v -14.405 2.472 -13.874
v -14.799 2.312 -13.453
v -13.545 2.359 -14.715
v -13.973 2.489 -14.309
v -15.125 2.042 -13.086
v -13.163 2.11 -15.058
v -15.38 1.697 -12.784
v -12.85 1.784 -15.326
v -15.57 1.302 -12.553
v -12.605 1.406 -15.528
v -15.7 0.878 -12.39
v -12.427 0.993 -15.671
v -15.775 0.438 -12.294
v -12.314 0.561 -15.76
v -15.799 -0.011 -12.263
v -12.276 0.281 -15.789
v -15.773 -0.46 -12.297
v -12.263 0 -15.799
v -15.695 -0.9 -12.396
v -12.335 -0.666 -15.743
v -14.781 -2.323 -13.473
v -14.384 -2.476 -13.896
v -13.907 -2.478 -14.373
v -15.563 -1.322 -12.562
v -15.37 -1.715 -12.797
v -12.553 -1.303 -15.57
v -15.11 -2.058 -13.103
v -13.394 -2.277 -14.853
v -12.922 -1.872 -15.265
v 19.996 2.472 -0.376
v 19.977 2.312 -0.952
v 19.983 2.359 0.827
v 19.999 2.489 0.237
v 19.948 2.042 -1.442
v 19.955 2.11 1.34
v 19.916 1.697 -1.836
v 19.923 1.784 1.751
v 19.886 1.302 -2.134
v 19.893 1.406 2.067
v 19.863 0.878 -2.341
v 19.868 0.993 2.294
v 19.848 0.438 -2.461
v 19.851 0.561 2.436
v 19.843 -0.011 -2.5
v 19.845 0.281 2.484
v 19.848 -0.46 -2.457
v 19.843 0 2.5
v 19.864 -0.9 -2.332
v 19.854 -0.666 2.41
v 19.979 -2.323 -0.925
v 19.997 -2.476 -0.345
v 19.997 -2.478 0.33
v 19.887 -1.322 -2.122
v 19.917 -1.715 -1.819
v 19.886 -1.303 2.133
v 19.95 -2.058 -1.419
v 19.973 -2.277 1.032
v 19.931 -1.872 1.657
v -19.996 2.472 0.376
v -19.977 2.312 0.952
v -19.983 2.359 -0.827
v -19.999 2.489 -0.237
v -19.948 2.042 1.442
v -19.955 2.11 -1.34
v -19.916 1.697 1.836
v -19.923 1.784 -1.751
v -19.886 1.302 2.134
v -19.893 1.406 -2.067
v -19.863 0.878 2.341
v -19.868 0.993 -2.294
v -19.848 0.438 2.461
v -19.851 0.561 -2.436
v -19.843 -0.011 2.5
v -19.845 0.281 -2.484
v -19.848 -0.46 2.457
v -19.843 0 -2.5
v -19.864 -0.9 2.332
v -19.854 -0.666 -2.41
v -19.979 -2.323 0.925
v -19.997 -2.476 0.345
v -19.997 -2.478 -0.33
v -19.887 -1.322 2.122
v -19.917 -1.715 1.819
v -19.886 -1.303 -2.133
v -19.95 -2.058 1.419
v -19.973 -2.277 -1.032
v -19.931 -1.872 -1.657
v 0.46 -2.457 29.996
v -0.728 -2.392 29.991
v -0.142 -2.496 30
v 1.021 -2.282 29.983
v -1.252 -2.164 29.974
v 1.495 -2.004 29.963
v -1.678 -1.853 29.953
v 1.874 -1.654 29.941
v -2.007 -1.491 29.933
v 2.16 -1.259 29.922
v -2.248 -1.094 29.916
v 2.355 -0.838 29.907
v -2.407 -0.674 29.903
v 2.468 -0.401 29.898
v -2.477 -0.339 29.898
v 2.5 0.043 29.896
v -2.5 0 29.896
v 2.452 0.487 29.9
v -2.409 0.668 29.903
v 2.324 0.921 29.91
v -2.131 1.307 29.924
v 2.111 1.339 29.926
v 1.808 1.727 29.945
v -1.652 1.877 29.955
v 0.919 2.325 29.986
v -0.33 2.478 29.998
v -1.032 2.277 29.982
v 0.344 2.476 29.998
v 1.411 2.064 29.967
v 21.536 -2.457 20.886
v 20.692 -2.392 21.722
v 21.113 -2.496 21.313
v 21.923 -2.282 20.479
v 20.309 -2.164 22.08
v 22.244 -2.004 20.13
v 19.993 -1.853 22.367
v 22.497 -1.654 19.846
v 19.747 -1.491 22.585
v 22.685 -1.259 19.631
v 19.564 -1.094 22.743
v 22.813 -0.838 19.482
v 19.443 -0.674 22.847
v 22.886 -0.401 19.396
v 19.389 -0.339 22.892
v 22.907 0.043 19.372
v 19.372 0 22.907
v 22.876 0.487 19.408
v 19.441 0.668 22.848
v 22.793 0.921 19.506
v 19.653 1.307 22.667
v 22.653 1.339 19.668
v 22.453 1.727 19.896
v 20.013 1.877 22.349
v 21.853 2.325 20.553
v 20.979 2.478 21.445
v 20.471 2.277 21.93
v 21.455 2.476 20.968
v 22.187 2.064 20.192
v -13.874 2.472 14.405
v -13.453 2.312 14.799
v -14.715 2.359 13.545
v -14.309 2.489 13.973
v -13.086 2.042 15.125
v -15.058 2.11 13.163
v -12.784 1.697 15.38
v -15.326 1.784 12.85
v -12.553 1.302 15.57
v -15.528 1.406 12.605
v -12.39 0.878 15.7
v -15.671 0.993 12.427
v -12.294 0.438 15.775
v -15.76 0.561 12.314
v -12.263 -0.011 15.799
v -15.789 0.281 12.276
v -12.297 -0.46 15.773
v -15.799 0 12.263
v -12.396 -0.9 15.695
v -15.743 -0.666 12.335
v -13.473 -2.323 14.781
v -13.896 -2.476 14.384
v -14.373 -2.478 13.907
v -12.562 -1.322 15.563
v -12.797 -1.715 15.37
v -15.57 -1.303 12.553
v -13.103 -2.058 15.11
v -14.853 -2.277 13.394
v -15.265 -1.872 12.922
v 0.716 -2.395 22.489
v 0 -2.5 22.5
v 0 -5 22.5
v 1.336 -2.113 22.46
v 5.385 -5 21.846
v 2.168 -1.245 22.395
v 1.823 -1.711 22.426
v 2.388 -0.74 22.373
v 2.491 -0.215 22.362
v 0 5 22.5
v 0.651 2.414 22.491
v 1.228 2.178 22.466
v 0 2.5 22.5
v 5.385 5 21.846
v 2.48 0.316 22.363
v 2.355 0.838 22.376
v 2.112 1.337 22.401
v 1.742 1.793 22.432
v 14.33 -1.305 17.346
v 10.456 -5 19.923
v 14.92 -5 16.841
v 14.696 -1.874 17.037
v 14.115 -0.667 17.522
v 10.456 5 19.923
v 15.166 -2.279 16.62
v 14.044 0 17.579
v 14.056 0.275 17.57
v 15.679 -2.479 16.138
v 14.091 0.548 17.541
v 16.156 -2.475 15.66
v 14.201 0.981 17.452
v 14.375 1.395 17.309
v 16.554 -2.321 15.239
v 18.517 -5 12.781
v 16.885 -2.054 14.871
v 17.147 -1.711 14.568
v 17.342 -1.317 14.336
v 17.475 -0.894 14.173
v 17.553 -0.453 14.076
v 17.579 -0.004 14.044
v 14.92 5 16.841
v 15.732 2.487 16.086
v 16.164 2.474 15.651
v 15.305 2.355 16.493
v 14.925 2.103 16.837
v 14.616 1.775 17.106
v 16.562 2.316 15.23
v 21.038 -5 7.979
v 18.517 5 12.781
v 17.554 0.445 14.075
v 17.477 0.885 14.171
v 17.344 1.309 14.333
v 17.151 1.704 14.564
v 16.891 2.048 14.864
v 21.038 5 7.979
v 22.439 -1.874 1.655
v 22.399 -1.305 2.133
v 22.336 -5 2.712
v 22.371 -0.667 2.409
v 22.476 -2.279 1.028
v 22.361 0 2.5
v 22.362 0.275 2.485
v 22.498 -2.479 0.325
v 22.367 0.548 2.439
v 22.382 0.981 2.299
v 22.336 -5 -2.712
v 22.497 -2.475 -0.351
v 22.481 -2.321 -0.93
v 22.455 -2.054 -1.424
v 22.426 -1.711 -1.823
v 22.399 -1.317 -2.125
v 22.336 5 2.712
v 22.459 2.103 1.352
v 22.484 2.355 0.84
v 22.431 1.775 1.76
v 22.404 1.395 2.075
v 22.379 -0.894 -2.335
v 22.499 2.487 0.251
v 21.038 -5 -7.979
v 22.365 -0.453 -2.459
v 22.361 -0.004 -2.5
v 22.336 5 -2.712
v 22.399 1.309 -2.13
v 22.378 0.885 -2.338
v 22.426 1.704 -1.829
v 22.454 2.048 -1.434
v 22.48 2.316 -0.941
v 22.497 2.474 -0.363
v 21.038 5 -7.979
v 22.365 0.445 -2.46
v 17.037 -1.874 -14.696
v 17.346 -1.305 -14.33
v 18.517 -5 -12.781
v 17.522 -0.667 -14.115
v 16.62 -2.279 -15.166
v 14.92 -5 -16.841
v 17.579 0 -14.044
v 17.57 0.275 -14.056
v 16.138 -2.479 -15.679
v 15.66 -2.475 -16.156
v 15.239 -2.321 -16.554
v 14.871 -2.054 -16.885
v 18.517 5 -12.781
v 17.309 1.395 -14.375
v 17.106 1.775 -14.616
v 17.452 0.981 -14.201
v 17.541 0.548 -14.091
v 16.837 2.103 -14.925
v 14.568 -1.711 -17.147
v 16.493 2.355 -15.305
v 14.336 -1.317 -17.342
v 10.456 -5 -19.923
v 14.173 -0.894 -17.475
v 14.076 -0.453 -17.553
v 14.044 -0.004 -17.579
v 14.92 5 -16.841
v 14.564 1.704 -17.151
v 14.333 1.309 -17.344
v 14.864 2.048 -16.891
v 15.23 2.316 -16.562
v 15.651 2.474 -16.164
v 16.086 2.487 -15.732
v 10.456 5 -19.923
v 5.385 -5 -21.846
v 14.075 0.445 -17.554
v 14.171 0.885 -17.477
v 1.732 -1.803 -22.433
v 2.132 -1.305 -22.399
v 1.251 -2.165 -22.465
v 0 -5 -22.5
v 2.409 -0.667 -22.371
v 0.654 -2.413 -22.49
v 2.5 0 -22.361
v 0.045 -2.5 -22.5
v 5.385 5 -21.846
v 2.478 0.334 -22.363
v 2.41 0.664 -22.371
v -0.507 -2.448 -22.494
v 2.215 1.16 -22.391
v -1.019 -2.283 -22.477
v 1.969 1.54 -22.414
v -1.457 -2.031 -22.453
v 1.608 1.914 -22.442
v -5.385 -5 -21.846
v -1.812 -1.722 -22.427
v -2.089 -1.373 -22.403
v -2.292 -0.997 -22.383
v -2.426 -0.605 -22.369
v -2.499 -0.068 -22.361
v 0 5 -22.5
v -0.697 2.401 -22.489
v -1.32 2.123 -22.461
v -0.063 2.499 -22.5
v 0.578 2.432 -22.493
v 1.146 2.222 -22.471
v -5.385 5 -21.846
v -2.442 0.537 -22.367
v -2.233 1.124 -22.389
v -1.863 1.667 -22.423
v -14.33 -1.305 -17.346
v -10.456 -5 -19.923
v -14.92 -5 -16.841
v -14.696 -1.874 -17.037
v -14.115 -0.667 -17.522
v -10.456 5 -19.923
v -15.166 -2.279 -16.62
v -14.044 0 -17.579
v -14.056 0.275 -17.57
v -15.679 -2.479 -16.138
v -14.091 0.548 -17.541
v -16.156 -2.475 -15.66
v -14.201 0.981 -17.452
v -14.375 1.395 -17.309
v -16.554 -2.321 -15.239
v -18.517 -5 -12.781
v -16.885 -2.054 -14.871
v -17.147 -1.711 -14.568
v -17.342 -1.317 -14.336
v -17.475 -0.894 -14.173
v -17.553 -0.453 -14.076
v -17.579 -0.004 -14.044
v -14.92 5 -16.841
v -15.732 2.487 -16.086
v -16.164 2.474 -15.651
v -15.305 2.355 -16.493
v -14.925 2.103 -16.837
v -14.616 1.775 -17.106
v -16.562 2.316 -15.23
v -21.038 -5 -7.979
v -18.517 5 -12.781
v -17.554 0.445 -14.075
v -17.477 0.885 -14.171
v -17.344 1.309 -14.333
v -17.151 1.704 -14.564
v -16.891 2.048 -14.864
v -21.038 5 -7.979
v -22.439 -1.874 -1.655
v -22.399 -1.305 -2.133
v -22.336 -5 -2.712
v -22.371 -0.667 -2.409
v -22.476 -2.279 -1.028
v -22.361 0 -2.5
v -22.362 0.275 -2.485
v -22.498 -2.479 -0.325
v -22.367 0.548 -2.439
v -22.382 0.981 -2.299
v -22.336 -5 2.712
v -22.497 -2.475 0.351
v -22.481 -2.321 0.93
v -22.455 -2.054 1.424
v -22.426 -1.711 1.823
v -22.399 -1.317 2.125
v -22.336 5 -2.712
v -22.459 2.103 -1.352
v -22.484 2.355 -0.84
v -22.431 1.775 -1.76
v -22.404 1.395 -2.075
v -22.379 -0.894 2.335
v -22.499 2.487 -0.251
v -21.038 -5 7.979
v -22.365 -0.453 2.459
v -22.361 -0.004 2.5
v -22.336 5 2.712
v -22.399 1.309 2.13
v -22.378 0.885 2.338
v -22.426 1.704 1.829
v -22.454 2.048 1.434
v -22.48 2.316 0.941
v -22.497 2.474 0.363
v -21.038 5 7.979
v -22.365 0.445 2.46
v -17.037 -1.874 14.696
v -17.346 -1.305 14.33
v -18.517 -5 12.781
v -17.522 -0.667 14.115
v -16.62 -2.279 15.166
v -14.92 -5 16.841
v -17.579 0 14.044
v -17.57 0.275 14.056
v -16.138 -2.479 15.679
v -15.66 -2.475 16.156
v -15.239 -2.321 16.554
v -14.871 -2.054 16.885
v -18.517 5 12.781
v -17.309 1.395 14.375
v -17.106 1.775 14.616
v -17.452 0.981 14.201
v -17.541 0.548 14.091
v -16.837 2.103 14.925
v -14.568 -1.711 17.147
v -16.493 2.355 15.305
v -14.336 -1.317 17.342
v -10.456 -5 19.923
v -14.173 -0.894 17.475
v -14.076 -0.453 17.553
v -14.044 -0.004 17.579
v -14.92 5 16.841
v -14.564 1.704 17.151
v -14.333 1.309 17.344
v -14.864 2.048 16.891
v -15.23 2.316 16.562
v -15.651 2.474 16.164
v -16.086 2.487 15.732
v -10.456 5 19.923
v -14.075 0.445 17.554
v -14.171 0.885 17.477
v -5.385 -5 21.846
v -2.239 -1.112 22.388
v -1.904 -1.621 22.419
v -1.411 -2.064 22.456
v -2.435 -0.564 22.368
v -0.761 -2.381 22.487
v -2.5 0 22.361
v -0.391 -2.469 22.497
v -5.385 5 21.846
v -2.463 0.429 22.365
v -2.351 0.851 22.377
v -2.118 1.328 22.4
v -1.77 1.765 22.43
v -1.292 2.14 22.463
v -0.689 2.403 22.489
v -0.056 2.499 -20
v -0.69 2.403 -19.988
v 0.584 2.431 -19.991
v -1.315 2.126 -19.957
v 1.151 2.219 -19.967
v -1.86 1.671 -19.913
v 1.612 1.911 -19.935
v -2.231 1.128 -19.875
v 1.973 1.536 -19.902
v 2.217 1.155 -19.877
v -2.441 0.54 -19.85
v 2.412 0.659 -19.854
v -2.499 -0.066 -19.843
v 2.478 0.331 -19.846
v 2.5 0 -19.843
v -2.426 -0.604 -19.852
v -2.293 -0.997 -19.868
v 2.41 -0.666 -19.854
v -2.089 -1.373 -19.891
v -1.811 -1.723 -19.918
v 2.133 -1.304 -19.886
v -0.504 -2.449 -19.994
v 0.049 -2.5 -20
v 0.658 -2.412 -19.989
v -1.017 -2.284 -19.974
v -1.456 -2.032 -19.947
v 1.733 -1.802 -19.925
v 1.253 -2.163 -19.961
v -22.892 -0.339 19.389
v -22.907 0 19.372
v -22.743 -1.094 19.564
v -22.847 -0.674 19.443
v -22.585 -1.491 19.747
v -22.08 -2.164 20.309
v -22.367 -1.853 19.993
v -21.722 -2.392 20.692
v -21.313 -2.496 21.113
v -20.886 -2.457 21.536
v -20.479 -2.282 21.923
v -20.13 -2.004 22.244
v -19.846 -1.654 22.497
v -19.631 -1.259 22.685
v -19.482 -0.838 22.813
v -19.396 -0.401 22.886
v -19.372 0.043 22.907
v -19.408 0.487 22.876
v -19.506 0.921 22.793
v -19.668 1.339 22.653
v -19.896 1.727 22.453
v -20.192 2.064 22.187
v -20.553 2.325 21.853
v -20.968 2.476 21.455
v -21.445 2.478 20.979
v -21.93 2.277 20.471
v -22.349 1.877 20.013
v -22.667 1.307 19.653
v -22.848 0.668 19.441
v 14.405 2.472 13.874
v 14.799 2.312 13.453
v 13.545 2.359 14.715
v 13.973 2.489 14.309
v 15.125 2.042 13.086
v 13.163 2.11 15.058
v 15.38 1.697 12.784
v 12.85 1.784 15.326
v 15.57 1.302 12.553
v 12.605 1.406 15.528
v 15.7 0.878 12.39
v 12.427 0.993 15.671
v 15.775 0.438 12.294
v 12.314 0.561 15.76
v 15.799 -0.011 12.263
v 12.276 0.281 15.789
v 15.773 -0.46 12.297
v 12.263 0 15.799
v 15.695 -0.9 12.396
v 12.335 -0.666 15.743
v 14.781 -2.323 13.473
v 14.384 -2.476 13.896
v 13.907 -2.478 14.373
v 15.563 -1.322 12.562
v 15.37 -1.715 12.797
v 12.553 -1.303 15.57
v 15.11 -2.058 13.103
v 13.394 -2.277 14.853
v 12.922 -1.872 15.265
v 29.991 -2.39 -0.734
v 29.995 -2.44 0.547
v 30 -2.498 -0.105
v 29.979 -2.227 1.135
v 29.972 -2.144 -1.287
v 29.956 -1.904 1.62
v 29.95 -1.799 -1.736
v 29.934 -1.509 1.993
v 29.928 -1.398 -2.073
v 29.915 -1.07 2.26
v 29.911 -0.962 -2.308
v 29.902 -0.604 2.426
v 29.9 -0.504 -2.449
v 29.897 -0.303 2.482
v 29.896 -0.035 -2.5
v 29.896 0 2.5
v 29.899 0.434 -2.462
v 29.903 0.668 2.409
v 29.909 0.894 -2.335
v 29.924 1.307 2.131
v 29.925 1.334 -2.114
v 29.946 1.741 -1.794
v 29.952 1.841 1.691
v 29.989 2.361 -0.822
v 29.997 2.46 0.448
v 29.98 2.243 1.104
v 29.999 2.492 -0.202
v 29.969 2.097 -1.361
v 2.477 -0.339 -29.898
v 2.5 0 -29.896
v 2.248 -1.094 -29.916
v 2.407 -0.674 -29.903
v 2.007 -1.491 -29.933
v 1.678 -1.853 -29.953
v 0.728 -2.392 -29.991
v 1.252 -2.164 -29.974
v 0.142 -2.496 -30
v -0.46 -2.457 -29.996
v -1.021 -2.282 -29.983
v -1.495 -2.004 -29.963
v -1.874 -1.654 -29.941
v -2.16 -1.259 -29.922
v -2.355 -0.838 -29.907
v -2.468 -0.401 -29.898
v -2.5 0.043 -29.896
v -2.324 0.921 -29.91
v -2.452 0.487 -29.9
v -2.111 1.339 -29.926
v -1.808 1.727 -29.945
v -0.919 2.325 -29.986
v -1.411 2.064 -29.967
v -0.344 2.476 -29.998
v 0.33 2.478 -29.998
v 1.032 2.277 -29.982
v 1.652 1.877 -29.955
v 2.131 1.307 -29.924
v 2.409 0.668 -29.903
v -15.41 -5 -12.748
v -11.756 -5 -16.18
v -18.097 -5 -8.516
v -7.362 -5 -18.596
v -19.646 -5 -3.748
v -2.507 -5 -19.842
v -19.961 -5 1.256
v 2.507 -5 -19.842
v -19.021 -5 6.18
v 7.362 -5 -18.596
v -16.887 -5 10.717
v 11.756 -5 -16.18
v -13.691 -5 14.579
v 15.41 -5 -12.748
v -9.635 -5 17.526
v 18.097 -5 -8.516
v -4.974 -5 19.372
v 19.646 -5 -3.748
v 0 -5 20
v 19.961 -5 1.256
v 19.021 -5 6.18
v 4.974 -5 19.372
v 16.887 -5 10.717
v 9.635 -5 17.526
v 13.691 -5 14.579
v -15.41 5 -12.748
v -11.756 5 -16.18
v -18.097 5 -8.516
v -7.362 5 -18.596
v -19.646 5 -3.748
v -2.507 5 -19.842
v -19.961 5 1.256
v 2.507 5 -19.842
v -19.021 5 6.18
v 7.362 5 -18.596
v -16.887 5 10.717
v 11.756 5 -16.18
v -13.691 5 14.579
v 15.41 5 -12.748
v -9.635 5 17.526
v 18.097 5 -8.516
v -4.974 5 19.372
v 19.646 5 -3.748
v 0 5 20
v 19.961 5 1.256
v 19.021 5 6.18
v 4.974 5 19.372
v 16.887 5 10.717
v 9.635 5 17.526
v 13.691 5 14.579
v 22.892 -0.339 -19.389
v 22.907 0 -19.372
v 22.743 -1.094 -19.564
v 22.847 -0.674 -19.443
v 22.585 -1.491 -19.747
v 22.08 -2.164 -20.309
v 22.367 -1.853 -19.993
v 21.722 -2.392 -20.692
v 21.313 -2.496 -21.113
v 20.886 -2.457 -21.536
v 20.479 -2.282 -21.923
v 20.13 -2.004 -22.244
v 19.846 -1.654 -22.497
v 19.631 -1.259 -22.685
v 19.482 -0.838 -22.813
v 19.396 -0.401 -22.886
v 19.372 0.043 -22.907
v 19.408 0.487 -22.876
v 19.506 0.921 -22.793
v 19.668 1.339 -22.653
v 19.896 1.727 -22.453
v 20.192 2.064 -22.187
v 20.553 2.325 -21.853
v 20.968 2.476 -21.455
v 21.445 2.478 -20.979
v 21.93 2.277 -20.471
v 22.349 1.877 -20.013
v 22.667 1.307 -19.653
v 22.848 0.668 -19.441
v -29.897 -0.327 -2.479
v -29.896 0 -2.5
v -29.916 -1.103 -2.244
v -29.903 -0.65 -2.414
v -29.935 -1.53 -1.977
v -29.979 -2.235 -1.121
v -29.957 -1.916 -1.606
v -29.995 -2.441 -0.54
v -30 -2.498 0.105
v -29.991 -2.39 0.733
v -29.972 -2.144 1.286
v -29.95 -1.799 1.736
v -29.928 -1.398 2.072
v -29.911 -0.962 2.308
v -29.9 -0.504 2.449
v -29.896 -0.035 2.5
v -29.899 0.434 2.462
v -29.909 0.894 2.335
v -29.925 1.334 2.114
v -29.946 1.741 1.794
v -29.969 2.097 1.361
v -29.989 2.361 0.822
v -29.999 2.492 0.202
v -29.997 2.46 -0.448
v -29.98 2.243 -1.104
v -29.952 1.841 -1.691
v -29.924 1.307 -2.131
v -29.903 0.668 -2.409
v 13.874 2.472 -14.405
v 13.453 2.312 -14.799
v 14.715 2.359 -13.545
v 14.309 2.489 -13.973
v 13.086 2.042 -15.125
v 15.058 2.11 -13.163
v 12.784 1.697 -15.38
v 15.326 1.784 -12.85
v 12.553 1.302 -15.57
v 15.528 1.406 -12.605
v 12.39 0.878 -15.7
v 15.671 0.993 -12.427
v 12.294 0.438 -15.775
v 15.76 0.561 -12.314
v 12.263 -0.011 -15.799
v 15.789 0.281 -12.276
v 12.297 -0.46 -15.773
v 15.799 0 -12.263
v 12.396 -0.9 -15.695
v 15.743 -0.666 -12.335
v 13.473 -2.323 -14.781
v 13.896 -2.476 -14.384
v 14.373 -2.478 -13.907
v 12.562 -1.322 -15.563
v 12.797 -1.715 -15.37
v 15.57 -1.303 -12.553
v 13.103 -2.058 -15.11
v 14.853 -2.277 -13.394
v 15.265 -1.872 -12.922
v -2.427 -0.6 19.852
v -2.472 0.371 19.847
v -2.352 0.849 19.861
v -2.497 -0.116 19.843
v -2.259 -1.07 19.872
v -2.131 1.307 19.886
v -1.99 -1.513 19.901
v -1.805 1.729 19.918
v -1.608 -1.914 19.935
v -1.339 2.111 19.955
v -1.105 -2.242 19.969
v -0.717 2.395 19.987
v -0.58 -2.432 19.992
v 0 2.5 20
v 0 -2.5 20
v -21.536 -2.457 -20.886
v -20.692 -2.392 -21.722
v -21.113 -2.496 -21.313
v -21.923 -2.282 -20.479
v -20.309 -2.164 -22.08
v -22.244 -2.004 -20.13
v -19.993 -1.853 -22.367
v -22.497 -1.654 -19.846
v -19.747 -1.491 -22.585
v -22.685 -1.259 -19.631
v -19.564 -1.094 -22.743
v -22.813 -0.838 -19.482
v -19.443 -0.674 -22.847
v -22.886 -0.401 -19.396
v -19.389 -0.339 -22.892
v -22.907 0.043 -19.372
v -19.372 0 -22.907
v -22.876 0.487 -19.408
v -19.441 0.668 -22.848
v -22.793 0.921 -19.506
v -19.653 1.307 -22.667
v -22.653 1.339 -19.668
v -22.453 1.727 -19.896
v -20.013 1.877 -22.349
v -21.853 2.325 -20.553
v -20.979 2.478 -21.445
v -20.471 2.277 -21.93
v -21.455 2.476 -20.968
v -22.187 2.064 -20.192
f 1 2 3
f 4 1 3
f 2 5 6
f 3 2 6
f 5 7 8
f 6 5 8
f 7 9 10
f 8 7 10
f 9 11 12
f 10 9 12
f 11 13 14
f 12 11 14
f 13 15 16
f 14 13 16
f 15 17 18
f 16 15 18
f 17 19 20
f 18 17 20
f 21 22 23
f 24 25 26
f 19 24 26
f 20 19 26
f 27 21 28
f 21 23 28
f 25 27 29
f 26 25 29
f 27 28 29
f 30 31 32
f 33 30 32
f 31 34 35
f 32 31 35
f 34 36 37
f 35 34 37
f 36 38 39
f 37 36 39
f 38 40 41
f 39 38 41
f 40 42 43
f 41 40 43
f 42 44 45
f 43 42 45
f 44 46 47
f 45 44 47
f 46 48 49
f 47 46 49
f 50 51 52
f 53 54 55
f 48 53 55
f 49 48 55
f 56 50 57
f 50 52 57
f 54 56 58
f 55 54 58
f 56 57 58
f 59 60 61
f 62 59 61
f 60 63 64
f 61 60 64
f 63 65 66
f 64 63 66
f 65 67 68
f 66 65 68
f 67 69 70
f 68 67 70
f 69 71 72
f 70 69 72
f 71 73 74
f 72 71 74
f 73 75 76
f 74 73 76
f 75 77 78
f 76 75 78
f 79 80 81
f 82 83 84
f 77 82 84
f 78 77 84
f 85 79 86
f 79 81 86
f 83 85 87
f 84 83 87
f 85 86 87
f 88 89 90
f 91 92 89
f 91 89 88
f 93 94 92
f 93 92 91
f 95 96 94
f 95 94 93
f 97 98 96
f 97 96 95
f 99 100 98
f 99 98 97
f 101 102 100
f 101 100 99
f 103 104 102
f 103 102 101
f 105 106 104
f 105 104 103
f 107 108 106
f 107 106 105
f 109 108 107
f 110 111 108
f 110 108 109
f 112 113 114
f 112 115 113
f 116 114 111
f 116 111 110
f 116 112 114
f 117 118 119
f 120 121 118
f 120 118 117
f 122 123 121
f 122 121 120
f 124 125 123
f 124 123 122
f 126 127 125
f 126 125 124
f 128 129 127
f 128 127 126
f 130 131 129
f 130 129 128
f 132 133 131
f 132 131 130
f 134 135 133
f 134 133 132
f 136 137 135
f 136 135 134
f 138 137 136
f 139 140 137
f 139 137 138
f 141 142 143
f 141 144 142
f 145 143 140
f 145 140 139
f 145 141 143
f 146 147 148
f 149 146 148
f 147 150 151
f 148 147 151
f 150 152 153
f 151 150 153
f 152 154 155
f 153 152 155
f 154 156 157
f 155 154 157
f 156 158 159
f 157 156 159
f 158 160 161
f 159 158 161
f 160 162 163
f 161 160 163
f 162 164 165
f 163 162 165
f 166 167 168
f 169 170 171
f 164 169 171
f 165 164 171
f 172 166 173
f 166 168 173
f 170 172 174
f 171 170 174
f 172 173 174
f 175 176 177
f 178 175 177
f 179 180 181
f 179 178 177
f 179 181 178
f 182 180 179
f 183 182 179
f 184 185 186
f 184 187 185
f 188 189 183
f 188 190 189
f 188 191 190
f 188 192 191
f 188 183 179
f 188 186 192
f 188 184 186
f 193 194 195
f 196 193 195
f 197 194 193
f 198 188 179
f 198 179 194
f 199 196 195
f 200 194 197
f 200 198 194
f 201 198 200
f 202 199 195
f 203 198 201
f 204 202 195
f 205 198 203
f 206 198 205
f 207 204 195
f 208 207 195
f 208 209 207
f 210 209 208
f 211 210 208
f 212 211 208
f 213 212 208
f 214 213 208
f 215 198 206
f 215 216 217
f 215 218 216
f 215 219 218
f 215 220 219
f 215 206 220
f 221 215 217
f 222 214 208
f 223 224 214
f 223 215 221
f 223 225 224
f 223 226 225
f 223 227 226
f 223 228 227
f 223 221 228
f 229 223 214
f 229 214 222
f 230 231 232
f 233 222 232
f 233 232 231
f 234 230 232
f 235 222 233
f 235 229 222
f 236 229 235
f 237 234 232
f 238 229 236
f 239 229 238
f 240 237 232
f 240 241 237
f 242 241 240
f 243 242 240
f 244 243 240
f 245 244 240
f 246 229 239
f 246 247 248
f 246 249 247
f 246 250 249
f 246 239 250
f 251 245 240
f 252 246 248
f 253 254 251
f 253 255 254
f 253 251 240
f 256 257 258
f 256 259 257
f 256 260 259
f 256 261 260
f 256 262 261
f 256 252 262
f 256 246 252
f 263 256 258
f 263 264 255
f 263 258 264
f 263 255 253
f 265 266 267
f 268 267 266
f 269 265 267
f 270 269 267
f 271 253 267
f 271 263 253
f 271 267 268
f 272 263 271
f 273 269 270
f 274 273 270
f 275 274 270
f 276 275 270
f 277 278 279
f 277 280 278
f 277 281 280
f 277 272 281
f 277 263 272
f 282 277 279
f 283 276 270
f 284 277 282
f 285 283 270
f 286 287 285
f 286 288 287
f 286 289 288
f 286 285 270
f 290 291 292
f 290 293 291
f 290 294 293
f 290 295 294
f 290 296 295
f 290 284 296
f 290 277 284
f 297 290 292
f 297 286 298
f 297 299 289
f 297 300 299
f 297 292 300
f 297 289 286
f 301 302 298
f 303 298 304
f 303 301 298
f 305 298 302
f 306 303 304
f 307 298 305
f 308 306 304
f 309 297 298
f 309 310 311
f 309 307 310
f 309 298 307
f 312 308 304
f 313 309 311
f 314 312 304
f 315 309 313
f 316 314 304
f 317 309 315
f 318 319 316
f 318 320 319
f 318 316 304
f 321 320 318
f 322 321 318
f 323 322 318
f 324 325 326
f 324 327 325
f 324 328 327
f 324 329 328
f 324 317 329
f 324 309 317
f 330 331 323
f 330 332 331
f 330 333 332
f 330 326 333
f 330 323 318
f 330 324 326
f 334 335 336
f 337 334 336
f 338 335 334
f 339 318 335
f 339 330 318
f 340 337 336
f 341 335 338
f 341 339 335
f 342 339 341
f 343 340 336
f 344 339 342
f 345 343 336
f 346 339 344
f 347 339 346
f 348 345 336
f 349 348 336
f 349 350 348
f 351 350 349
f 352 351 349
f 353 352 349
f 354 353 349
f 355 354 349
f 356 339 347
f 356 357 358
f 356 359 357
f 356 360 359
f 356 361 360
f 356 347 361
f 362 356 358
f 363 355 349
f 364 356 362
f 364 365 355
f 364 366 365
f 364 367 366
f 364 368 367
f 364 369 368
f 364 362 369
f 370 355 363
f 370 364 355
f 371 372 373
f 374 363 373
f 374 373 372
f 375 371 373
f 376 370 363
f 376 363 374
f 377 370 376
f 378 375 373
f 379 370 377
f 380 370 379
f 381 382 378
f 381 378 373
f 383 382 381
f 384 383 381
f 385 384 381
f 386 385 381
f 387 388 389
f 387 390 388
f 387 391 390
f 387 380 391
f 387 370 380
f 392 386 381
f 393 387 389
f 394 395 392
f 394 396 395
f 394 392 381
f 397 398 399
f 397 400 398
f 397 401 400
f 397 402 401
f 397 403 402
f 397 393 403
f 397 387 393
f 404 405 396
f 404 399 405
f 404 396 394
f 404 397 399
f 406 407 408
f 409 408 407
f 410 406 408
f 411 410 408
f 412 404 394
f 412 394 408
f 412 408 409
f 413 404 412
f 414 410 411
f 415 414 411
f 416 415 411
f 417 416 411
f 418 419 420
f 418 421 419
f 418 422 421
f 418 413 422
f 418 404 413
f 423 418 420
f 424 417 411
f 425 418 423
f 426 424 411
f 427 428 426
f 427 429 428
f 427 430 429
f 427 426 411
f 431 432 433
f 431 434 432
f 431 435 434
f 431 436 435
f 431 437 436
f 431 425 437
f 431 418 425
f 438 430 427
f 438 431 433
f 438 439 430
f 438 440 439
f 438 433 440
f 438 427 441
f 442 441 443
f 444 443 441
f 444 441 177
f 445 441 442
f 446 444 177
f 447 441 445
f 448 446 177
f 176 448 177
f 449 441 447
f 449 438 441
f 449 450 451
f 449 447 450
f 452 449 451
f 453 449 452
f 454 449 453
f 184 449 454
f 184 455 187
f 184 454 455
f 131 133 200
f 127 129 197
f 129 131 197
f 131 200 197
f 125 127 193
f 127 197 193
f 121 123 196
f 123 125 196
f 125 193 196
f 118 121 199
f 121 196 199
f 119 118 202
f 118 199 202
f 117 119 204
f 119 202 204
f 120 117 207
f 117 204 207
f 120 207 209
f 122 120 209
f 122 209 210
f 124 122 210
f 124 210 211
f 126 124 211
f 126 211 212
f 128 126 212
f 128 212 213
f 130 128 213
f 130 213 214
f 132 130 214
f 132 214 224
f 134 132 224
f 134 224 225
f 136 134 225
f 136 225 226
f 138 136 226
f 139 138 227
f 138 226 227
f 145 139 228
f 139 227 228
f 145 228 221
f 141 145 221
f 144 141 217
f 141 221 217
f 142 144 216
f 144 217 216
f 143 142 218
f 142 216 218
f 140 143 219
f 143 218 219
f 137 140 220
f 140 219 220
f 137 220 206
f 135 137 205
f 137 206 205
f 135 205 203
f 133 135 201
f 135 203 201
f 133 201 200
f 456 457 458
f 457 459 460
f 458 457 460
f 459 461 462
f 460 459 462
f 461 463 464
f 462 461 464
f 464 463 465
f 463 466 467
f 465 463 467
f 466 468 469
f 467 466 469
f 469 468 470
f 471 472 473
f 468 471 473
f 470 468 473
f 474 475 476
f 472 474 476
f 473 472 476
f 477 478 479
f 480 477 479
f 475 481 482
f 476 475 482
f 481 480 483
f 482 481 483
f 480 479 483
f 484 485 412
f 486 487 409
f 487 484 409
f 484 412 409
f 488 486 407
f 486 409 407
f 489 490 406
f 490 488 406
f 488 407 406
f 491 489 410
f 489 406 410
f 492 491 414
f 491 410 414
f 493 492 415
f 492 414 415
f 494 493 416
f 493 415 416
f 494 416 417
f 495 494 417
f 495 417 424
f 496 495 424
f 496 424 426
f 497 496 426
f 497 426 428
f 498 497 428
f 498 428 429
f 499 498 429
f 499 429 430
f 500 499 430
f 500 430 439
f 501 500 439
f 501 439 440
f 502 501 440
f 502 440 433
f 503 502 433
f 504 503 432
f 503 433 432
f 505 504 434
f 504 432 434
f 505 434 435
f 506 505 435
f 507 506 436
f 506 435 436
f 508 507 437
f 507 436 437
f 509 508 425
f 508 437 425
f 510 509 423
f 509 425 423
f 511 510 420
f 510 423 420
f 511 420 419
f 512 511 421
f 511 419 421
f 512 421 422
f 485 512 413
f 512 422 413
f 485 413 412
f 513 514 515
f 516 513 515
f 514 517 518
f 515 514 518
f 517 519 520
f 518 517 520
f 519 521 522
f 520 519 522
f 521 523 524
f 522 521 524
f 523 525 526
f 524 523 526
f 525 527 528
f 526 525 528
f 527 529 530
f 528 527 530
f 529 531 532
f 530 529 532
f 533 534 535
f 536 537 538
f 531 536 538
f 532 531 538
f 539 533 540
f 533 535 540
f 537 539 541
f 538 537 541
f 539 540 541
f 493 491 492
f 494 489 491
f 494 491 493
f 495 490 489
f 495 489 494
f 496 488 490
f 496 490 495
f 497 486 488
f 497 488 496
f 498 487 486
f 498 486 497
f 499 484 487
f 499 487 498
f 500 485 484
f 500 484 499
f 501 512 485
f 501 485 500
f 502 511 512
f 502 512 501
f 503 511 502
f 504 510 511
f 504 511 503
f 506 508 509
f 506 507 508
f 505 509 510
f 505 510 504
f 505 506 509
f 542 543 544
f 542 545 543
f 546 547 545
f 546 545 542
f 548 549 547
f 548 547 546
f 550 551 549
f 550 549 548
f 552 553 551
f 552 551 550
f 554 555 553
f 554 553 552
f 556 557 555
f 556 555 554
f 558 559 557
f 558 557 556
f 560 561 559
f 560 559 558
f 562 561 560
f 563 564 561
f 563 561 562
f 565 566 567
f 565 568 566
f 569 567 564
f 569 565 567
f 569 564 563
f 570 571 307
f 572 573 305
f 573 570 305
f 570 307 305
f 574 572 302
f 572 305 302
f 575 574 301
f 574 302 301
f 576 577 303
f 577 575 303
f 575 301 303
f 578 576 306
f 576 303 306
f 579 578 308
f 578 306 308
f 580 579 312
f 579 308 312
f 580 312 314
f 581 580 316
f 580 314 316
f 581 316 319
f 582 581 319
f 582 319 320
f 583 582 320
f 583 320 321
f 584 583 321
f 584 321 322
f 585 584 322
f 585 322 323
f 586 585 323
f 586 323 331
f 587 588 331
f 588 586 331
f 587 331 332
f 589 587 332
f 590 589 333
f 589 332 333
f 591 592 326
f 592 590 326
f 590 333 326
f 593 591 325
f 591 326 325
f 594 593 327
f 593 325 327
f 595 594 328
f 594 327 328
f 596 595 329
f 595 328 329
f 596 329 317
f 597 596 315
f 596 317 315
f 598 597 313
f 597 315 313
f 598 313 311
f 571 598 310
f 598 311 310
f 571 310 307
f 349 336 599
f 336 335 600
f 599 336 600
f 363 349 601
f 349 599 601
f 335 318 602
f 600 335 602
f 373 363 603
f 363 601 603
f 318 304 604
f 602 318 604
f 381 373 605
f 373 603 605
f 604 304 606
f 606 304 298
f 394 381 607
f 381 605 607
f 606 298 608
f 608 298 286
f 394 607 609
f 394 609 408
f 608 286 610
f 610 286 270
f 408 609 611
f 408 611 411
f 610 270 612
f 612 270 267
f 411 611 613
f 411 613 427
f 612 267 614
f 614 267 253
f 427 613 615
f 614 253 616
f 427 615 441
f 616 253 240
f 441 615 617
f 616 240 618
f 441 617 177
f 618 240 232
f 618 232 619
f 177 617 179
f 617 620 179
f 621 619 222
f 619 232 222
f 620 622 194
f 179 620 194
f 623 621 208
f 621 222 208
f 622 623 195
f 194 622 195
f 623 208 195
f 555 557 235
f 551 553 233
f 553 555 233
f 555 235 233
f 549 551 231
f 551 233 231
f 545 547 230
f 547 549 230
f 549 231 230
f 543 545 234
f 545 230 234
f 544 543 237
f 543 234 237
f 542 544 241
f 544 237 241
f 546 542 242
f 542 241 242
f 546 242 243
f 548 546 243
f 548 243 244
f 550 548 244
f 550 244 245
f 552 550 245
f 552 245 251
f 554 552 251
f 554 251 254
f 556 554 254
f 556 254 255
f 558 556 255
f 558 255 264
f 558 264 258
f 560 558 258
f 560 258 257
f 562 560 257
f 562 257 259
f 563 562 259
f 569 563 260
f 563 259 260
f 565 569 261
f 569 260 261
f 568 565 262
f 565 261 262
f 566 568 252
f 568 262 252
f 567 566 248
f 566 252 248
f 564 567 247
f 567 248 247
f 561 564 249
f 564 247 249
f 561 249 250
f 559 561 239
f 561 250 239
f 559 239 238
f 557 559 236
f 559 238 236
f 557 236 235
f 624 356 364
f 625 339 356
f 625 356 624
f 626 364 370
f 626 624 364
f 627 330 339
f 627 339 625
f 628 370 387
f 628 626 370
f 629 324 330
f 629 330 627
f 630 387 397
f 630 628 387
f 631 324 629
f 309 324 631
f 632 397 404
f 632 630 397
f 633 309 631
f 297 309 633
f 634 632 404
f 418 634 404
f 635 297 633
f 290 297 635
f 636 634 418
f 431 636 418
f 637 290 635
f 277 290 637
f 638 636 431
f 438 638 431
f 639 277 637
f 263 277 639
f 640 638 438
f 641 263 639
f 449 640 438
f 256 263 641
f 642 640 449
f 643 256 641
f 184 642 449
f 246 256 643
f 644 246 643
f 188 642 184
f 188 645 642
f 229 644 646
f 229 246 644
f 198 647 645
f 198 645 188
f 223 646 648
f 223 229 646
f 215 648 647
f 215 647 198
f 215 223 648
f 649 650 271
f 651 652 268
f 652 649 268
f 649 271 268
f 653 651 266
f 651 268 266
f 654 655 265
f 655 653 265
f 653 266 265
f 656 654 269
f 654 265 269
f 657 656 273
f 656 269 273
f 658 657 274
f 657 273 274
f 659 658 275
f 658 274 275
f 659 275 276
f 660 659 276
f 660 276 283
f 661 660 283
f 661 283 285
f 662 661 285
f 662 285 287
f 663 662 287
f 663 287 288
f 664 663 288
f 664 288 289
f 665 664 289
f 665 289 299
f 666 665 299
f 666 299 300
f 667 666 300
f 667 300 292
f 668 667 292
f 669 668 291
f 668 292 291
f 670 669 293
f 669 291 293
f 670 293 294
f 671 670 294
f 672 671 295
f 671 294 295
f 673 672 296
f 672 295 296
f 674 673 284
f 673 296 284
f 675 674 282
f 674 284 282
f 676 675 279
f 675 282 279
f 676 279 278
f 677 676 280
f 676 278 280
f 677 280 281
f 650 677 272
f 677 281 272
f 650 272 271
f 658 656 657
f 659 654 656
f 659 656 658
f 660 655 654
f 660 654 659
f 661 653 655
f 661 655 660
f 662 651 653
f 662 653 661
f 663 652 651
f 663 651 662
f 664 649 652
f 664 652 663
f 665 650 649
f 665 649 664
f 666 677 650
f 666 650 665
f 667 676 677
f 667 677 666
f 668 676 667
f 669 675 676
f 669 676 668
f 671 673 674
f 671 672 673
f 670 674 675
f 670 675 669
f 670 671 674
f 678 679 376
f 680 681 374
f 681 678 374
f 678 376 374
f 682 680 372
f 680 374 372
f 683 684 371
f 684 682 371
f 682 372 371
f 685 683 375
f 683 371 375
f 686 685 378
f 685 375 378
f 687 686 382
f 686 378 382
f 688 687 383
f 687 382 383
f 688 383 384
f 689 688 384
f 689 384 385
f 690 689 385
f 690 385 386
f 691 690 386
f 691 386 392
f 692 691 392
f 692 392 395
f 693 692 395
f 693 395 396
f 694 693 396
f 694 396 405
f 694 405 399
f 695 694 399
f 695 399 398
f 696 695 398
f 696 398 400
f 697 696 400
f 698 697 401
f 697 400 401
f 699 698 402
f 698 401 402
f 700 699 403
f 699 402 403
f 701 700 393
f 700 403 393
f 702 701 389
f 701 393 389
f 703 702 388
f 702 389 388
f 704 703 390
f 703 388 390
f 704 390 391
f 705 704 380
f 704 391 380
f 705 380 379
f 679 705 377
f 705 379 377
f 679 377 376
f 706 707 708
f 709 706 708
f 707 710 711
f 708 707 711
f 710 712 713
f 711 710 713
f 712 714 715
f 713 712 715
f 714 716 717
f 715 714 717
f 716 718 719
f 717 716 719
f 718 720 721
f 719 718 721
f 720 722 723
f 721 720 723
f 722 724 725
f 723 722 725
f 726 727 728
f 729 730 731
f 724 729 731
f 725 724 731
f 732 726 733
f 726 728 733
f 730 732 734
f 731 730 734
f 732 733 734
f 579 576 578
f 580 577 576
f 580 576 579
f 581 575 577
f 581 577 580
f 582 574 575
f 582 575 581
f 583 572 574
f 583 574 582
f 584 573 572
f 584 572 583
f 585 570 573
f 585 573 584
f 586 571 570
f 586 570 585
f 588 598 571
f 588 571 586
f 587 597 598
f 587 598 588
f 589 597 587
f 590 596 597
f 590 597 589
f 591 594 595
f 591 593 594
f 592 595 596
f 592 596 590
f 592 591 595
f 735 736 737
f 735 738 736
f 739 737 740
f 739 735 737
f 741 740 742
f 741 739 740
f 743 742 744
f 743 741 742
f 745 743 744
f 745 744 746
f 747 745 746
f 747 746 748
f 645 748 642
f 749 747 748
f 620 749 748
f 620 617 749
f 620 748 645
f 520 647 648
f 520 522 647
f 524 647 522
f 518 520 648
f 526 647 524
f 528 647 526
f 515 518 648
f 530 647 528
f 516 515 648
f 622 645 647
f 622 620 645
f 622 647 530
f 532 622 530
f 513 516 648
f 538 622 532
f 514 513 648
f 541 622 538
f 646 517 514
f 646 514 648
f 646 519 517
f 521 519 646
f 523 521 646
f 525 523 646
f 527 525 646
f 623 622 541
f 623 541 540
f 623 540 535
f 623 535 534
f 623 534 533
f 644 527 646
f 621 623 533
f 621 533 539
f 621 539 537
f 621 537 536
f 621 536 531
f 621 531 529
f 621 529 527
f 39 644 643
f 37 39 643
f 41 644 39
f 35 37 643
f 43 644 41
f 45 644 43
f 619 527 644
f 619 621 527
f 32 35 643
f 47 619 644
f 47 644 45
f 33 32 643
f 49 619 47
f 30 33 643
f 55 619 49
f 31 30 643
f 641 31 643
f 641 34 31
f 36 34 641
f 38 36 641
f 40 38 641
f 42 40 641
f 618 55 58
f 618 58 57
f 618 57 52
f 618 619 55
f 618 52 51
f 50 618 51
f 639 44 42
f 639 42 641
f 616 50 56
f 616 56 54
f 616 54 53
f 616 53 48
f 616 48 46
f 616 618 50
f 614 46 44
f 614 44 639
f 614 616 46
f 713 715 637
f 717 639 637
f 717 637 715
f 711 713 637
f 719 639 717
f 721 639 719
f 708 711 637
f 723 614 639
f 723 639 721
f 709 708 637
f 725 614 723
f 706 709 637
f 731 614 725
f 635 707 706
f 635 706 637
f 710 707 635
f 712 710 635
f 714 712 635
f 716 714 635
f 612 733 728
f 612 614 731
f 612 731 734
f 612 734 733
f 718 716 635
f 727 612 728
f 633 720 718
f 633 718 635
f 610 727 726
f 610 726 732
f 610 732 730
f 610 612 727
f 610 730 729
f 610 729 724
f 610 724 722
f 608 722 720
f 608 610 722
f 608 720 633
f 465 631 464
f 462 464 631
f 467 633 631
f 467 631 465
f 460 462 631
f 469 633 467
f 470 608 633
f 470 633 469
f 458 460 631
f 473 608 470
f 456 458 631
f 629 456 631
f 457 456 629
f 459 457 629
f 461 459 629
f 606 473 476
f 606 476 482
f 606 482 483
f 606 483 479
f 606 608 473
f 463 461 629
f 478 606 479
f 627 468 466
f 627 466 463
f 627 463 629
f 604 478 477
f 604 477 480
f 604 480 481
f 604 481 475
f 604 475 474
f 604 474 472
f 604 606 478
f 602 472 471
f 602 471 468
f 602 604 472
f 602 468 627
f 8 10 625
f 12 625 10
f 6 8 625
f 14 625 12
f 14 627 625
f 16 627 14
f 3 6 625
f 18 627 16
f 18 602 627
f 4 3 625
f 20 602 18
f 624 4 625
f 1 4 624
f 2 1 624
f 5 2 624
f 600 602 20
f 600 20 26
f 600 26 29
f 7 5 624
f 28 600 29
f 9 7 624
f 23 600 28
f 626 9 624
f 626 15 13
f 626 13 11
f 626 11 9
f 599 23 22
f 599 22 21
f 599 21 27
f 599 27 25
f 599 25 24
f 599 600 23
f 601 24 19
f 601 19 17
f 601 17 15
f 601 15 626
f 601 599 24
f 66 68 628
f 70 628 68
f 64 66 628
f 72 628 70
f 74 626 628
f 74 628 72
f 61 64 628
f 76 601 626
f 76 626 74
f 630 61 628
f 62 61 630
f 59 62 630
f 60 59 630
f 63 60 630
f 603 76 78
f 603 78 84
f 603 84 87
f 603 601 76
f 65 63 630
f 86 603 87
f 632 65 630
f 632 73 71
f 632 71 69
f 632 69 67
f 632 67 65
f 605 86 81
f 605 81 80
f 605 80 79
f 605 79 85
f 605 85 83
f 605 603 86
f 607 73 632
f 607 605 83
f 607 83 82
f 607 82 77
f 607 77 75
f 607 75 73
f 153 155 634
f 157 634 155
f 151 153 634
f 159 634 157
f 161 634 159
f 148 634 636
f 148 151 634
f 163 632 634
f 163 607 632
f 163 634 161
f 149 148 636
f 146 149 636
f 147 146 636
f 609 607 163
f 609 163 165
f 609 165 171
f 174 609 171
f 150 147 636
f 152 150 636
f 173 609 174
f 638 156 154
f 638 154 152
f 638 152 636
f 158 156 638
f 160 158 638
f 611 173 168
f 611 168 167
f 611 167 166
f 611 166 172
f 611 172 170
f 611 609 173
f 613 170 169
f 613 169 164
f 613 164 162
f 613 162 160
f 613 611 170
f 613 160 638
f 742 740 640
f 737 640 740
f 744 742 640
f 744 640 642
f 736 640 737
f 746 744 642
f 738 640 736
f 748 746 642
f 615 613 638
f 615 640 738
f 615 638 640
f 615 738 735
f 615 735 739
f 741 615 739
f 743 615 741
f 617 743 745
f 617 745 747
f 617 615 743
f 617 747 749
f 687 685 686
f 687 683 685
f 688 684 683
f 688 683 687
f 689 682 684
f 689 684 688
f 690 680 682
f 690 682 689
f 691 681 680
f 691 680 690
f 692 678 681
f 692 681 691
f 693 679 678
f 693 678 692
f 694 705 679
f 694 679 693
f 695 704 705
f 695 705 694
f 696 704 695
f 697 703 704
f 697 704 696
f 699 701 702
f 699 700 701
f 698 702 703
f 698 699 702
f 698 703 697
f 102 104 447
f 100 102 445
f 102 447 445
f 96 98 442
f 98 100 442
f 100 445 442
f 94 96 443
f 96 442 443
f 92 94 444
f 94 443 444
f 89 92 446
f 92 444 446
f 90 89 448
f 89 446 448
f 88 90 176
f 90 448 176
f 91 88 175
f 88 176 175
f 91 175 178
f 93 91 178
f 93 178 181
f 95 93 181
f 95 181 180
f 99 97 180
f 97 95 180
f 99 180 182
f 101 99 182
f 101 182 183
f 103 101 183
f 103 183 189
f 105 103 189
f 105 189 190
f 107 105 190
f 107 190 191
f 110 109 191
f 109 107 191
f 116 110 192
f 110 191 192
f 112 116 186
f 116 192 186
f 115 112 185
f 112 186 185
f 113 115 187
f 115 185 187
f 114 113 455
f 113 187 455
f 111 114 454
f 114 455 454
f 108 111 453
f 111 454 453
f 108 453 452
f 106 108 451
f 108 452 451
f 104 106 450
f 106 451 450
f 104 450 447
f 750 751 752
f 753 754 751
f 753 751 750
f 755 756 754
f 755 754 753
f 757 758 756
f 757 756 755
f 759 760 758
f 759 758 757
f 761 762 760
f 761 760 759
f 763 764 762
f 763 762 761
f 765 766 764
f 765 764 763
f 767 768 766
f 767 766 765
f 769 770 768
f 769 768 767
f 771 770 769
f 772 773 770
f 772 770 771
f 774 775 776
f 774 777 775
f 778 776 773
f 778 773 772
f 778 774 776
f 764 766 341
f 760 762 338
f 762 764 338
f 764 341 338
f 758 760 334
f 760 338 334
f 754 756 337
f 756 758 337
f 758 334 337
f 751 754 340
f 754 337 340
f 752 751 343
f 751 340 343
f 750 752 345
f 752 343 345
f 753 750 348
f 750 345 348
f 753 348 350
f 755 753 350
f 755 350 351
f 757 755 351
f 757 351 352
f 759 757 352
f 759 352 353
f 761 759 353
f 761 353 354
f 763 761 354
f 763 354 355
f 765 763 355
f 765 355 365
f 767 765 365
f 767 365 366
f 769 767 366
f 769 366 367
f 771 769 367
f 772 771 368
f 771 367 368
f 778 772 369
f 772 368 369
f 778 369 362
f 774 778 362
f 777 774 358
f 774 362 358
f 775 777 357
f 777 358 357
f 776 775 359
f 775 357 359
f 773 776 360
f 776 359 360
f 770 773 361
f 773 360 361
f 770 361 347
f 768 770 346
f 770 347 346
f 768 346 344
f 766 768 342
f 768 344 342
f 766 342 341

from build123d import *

# Parameters (mm, degrees)
SKETCH1_R           = 22.5
SKETCH1_R_2         = 20
BOSS_EXTRUDE1_DEPTH = 5
SKETCH4_R           = 2.5
BOSS_EXTRUDE3_DEPTH = 30
SKETCH5_R           = 20
CUT_EXTRUDE1_DEPTH  = 39.810436902
CIRPATTERN1_COUNT   = 8
SKETCH6_R           = 20
CUT_EXTRUDE2_DEPTH  = 44.588989596
SKETCH7_OUTSIDE_W   = 79.088
SKETCH7_OUTSIDE_H   = 79.088
SKETCH7_OUTSIDE_R   = 30
CUT_EXTRUDE4_DEPTH  = 44.588989596


with BuildPart() as part:
    # Sketch1 → Boss-Extrude1 (new, symmetric)
    with BuildSketch(Plane(origin=(0, 0, 0), x_dir=(1, 0, 0), z_dir=(0, 1, 0))):
        with Locations(Location((0, 0, 0), (0, 0, 270))):
            Circle(SKETCH1_R)
        with Locations(Location((0, 0, 0), (0, 0, 270))):
            Circle(SKETCH1_R_2, mode=Mode.SUBTRACT)
    extrude(amount=BOSS_EXTRUDE1_DEPTH, both=True)

    # Sketch4 → Boss-Extrude3 (add)
    with BuildSketch(Plane(origin=(0, 0, 0), x_dir=(0, 0, -1), z_dir=(1, 0, 0))):
        with Locations(Location((0, 0, 0), (0, 0, 180))):
            Circle(SKETCH4_R)
    boss_extrude3 = extrude(amount=BOSS_EXTRUDE3_DEPTH)

    # Sketch5 → Cut-Extrude1 (cut, through all)
    with BuildSketch(Plane.XZ.offset(5)):
        with Locations(Location((0, 0, 0), (0, 0, 90))):
            Circle(SKETCH5_R)
    extrude(amount=-CUT_EXTRUDE1_DEPTH, mode=Mode.SUBTRACT)

    # CirPattern1: Boss-Extrude3 ×8 about axis
    cirpattern1_axis = Axis((0, 0, 0), (0, 1, 0))
    for i in range(1, CIRPATTERN1_COUNT):
        add(boss_extrude3.rotate(cirpattern1_axis, i * 360 / CIRPATTERN1_COUNT))

    # Sketch6 → Cut-Extrude2 (cut, through all)
    with BuildSketch(Plane.XZ.offset(5)):
        with Locations(Location((0, 0, 0), (0, 0, 90))):
            Circle(SKETCH6_R)
    extrude(amount=-CUT_EXTRUDE2_DEPTH, mode=Mode.SUBTRACT)

    # Sketch7 outside → Cut-Extrude4 (cut, through all)
    with BuildSketch(Plane(origin=(0, 5, 0), x_dir=(1, 0, 0), z_dir=(0, 1, 0))):
        Rectangle(SKETCH7_OUTSIDE_W, SKETCH7_OUTSIDE_H)
        Circle(SKETCH7_OUTSIDE_R, mode=Mode.SUBTRACT)
    extrude(amount=-CUT_EXTRUDE4_DEPTH, mode=Mode.SUBTRACT)


solid = part.part
